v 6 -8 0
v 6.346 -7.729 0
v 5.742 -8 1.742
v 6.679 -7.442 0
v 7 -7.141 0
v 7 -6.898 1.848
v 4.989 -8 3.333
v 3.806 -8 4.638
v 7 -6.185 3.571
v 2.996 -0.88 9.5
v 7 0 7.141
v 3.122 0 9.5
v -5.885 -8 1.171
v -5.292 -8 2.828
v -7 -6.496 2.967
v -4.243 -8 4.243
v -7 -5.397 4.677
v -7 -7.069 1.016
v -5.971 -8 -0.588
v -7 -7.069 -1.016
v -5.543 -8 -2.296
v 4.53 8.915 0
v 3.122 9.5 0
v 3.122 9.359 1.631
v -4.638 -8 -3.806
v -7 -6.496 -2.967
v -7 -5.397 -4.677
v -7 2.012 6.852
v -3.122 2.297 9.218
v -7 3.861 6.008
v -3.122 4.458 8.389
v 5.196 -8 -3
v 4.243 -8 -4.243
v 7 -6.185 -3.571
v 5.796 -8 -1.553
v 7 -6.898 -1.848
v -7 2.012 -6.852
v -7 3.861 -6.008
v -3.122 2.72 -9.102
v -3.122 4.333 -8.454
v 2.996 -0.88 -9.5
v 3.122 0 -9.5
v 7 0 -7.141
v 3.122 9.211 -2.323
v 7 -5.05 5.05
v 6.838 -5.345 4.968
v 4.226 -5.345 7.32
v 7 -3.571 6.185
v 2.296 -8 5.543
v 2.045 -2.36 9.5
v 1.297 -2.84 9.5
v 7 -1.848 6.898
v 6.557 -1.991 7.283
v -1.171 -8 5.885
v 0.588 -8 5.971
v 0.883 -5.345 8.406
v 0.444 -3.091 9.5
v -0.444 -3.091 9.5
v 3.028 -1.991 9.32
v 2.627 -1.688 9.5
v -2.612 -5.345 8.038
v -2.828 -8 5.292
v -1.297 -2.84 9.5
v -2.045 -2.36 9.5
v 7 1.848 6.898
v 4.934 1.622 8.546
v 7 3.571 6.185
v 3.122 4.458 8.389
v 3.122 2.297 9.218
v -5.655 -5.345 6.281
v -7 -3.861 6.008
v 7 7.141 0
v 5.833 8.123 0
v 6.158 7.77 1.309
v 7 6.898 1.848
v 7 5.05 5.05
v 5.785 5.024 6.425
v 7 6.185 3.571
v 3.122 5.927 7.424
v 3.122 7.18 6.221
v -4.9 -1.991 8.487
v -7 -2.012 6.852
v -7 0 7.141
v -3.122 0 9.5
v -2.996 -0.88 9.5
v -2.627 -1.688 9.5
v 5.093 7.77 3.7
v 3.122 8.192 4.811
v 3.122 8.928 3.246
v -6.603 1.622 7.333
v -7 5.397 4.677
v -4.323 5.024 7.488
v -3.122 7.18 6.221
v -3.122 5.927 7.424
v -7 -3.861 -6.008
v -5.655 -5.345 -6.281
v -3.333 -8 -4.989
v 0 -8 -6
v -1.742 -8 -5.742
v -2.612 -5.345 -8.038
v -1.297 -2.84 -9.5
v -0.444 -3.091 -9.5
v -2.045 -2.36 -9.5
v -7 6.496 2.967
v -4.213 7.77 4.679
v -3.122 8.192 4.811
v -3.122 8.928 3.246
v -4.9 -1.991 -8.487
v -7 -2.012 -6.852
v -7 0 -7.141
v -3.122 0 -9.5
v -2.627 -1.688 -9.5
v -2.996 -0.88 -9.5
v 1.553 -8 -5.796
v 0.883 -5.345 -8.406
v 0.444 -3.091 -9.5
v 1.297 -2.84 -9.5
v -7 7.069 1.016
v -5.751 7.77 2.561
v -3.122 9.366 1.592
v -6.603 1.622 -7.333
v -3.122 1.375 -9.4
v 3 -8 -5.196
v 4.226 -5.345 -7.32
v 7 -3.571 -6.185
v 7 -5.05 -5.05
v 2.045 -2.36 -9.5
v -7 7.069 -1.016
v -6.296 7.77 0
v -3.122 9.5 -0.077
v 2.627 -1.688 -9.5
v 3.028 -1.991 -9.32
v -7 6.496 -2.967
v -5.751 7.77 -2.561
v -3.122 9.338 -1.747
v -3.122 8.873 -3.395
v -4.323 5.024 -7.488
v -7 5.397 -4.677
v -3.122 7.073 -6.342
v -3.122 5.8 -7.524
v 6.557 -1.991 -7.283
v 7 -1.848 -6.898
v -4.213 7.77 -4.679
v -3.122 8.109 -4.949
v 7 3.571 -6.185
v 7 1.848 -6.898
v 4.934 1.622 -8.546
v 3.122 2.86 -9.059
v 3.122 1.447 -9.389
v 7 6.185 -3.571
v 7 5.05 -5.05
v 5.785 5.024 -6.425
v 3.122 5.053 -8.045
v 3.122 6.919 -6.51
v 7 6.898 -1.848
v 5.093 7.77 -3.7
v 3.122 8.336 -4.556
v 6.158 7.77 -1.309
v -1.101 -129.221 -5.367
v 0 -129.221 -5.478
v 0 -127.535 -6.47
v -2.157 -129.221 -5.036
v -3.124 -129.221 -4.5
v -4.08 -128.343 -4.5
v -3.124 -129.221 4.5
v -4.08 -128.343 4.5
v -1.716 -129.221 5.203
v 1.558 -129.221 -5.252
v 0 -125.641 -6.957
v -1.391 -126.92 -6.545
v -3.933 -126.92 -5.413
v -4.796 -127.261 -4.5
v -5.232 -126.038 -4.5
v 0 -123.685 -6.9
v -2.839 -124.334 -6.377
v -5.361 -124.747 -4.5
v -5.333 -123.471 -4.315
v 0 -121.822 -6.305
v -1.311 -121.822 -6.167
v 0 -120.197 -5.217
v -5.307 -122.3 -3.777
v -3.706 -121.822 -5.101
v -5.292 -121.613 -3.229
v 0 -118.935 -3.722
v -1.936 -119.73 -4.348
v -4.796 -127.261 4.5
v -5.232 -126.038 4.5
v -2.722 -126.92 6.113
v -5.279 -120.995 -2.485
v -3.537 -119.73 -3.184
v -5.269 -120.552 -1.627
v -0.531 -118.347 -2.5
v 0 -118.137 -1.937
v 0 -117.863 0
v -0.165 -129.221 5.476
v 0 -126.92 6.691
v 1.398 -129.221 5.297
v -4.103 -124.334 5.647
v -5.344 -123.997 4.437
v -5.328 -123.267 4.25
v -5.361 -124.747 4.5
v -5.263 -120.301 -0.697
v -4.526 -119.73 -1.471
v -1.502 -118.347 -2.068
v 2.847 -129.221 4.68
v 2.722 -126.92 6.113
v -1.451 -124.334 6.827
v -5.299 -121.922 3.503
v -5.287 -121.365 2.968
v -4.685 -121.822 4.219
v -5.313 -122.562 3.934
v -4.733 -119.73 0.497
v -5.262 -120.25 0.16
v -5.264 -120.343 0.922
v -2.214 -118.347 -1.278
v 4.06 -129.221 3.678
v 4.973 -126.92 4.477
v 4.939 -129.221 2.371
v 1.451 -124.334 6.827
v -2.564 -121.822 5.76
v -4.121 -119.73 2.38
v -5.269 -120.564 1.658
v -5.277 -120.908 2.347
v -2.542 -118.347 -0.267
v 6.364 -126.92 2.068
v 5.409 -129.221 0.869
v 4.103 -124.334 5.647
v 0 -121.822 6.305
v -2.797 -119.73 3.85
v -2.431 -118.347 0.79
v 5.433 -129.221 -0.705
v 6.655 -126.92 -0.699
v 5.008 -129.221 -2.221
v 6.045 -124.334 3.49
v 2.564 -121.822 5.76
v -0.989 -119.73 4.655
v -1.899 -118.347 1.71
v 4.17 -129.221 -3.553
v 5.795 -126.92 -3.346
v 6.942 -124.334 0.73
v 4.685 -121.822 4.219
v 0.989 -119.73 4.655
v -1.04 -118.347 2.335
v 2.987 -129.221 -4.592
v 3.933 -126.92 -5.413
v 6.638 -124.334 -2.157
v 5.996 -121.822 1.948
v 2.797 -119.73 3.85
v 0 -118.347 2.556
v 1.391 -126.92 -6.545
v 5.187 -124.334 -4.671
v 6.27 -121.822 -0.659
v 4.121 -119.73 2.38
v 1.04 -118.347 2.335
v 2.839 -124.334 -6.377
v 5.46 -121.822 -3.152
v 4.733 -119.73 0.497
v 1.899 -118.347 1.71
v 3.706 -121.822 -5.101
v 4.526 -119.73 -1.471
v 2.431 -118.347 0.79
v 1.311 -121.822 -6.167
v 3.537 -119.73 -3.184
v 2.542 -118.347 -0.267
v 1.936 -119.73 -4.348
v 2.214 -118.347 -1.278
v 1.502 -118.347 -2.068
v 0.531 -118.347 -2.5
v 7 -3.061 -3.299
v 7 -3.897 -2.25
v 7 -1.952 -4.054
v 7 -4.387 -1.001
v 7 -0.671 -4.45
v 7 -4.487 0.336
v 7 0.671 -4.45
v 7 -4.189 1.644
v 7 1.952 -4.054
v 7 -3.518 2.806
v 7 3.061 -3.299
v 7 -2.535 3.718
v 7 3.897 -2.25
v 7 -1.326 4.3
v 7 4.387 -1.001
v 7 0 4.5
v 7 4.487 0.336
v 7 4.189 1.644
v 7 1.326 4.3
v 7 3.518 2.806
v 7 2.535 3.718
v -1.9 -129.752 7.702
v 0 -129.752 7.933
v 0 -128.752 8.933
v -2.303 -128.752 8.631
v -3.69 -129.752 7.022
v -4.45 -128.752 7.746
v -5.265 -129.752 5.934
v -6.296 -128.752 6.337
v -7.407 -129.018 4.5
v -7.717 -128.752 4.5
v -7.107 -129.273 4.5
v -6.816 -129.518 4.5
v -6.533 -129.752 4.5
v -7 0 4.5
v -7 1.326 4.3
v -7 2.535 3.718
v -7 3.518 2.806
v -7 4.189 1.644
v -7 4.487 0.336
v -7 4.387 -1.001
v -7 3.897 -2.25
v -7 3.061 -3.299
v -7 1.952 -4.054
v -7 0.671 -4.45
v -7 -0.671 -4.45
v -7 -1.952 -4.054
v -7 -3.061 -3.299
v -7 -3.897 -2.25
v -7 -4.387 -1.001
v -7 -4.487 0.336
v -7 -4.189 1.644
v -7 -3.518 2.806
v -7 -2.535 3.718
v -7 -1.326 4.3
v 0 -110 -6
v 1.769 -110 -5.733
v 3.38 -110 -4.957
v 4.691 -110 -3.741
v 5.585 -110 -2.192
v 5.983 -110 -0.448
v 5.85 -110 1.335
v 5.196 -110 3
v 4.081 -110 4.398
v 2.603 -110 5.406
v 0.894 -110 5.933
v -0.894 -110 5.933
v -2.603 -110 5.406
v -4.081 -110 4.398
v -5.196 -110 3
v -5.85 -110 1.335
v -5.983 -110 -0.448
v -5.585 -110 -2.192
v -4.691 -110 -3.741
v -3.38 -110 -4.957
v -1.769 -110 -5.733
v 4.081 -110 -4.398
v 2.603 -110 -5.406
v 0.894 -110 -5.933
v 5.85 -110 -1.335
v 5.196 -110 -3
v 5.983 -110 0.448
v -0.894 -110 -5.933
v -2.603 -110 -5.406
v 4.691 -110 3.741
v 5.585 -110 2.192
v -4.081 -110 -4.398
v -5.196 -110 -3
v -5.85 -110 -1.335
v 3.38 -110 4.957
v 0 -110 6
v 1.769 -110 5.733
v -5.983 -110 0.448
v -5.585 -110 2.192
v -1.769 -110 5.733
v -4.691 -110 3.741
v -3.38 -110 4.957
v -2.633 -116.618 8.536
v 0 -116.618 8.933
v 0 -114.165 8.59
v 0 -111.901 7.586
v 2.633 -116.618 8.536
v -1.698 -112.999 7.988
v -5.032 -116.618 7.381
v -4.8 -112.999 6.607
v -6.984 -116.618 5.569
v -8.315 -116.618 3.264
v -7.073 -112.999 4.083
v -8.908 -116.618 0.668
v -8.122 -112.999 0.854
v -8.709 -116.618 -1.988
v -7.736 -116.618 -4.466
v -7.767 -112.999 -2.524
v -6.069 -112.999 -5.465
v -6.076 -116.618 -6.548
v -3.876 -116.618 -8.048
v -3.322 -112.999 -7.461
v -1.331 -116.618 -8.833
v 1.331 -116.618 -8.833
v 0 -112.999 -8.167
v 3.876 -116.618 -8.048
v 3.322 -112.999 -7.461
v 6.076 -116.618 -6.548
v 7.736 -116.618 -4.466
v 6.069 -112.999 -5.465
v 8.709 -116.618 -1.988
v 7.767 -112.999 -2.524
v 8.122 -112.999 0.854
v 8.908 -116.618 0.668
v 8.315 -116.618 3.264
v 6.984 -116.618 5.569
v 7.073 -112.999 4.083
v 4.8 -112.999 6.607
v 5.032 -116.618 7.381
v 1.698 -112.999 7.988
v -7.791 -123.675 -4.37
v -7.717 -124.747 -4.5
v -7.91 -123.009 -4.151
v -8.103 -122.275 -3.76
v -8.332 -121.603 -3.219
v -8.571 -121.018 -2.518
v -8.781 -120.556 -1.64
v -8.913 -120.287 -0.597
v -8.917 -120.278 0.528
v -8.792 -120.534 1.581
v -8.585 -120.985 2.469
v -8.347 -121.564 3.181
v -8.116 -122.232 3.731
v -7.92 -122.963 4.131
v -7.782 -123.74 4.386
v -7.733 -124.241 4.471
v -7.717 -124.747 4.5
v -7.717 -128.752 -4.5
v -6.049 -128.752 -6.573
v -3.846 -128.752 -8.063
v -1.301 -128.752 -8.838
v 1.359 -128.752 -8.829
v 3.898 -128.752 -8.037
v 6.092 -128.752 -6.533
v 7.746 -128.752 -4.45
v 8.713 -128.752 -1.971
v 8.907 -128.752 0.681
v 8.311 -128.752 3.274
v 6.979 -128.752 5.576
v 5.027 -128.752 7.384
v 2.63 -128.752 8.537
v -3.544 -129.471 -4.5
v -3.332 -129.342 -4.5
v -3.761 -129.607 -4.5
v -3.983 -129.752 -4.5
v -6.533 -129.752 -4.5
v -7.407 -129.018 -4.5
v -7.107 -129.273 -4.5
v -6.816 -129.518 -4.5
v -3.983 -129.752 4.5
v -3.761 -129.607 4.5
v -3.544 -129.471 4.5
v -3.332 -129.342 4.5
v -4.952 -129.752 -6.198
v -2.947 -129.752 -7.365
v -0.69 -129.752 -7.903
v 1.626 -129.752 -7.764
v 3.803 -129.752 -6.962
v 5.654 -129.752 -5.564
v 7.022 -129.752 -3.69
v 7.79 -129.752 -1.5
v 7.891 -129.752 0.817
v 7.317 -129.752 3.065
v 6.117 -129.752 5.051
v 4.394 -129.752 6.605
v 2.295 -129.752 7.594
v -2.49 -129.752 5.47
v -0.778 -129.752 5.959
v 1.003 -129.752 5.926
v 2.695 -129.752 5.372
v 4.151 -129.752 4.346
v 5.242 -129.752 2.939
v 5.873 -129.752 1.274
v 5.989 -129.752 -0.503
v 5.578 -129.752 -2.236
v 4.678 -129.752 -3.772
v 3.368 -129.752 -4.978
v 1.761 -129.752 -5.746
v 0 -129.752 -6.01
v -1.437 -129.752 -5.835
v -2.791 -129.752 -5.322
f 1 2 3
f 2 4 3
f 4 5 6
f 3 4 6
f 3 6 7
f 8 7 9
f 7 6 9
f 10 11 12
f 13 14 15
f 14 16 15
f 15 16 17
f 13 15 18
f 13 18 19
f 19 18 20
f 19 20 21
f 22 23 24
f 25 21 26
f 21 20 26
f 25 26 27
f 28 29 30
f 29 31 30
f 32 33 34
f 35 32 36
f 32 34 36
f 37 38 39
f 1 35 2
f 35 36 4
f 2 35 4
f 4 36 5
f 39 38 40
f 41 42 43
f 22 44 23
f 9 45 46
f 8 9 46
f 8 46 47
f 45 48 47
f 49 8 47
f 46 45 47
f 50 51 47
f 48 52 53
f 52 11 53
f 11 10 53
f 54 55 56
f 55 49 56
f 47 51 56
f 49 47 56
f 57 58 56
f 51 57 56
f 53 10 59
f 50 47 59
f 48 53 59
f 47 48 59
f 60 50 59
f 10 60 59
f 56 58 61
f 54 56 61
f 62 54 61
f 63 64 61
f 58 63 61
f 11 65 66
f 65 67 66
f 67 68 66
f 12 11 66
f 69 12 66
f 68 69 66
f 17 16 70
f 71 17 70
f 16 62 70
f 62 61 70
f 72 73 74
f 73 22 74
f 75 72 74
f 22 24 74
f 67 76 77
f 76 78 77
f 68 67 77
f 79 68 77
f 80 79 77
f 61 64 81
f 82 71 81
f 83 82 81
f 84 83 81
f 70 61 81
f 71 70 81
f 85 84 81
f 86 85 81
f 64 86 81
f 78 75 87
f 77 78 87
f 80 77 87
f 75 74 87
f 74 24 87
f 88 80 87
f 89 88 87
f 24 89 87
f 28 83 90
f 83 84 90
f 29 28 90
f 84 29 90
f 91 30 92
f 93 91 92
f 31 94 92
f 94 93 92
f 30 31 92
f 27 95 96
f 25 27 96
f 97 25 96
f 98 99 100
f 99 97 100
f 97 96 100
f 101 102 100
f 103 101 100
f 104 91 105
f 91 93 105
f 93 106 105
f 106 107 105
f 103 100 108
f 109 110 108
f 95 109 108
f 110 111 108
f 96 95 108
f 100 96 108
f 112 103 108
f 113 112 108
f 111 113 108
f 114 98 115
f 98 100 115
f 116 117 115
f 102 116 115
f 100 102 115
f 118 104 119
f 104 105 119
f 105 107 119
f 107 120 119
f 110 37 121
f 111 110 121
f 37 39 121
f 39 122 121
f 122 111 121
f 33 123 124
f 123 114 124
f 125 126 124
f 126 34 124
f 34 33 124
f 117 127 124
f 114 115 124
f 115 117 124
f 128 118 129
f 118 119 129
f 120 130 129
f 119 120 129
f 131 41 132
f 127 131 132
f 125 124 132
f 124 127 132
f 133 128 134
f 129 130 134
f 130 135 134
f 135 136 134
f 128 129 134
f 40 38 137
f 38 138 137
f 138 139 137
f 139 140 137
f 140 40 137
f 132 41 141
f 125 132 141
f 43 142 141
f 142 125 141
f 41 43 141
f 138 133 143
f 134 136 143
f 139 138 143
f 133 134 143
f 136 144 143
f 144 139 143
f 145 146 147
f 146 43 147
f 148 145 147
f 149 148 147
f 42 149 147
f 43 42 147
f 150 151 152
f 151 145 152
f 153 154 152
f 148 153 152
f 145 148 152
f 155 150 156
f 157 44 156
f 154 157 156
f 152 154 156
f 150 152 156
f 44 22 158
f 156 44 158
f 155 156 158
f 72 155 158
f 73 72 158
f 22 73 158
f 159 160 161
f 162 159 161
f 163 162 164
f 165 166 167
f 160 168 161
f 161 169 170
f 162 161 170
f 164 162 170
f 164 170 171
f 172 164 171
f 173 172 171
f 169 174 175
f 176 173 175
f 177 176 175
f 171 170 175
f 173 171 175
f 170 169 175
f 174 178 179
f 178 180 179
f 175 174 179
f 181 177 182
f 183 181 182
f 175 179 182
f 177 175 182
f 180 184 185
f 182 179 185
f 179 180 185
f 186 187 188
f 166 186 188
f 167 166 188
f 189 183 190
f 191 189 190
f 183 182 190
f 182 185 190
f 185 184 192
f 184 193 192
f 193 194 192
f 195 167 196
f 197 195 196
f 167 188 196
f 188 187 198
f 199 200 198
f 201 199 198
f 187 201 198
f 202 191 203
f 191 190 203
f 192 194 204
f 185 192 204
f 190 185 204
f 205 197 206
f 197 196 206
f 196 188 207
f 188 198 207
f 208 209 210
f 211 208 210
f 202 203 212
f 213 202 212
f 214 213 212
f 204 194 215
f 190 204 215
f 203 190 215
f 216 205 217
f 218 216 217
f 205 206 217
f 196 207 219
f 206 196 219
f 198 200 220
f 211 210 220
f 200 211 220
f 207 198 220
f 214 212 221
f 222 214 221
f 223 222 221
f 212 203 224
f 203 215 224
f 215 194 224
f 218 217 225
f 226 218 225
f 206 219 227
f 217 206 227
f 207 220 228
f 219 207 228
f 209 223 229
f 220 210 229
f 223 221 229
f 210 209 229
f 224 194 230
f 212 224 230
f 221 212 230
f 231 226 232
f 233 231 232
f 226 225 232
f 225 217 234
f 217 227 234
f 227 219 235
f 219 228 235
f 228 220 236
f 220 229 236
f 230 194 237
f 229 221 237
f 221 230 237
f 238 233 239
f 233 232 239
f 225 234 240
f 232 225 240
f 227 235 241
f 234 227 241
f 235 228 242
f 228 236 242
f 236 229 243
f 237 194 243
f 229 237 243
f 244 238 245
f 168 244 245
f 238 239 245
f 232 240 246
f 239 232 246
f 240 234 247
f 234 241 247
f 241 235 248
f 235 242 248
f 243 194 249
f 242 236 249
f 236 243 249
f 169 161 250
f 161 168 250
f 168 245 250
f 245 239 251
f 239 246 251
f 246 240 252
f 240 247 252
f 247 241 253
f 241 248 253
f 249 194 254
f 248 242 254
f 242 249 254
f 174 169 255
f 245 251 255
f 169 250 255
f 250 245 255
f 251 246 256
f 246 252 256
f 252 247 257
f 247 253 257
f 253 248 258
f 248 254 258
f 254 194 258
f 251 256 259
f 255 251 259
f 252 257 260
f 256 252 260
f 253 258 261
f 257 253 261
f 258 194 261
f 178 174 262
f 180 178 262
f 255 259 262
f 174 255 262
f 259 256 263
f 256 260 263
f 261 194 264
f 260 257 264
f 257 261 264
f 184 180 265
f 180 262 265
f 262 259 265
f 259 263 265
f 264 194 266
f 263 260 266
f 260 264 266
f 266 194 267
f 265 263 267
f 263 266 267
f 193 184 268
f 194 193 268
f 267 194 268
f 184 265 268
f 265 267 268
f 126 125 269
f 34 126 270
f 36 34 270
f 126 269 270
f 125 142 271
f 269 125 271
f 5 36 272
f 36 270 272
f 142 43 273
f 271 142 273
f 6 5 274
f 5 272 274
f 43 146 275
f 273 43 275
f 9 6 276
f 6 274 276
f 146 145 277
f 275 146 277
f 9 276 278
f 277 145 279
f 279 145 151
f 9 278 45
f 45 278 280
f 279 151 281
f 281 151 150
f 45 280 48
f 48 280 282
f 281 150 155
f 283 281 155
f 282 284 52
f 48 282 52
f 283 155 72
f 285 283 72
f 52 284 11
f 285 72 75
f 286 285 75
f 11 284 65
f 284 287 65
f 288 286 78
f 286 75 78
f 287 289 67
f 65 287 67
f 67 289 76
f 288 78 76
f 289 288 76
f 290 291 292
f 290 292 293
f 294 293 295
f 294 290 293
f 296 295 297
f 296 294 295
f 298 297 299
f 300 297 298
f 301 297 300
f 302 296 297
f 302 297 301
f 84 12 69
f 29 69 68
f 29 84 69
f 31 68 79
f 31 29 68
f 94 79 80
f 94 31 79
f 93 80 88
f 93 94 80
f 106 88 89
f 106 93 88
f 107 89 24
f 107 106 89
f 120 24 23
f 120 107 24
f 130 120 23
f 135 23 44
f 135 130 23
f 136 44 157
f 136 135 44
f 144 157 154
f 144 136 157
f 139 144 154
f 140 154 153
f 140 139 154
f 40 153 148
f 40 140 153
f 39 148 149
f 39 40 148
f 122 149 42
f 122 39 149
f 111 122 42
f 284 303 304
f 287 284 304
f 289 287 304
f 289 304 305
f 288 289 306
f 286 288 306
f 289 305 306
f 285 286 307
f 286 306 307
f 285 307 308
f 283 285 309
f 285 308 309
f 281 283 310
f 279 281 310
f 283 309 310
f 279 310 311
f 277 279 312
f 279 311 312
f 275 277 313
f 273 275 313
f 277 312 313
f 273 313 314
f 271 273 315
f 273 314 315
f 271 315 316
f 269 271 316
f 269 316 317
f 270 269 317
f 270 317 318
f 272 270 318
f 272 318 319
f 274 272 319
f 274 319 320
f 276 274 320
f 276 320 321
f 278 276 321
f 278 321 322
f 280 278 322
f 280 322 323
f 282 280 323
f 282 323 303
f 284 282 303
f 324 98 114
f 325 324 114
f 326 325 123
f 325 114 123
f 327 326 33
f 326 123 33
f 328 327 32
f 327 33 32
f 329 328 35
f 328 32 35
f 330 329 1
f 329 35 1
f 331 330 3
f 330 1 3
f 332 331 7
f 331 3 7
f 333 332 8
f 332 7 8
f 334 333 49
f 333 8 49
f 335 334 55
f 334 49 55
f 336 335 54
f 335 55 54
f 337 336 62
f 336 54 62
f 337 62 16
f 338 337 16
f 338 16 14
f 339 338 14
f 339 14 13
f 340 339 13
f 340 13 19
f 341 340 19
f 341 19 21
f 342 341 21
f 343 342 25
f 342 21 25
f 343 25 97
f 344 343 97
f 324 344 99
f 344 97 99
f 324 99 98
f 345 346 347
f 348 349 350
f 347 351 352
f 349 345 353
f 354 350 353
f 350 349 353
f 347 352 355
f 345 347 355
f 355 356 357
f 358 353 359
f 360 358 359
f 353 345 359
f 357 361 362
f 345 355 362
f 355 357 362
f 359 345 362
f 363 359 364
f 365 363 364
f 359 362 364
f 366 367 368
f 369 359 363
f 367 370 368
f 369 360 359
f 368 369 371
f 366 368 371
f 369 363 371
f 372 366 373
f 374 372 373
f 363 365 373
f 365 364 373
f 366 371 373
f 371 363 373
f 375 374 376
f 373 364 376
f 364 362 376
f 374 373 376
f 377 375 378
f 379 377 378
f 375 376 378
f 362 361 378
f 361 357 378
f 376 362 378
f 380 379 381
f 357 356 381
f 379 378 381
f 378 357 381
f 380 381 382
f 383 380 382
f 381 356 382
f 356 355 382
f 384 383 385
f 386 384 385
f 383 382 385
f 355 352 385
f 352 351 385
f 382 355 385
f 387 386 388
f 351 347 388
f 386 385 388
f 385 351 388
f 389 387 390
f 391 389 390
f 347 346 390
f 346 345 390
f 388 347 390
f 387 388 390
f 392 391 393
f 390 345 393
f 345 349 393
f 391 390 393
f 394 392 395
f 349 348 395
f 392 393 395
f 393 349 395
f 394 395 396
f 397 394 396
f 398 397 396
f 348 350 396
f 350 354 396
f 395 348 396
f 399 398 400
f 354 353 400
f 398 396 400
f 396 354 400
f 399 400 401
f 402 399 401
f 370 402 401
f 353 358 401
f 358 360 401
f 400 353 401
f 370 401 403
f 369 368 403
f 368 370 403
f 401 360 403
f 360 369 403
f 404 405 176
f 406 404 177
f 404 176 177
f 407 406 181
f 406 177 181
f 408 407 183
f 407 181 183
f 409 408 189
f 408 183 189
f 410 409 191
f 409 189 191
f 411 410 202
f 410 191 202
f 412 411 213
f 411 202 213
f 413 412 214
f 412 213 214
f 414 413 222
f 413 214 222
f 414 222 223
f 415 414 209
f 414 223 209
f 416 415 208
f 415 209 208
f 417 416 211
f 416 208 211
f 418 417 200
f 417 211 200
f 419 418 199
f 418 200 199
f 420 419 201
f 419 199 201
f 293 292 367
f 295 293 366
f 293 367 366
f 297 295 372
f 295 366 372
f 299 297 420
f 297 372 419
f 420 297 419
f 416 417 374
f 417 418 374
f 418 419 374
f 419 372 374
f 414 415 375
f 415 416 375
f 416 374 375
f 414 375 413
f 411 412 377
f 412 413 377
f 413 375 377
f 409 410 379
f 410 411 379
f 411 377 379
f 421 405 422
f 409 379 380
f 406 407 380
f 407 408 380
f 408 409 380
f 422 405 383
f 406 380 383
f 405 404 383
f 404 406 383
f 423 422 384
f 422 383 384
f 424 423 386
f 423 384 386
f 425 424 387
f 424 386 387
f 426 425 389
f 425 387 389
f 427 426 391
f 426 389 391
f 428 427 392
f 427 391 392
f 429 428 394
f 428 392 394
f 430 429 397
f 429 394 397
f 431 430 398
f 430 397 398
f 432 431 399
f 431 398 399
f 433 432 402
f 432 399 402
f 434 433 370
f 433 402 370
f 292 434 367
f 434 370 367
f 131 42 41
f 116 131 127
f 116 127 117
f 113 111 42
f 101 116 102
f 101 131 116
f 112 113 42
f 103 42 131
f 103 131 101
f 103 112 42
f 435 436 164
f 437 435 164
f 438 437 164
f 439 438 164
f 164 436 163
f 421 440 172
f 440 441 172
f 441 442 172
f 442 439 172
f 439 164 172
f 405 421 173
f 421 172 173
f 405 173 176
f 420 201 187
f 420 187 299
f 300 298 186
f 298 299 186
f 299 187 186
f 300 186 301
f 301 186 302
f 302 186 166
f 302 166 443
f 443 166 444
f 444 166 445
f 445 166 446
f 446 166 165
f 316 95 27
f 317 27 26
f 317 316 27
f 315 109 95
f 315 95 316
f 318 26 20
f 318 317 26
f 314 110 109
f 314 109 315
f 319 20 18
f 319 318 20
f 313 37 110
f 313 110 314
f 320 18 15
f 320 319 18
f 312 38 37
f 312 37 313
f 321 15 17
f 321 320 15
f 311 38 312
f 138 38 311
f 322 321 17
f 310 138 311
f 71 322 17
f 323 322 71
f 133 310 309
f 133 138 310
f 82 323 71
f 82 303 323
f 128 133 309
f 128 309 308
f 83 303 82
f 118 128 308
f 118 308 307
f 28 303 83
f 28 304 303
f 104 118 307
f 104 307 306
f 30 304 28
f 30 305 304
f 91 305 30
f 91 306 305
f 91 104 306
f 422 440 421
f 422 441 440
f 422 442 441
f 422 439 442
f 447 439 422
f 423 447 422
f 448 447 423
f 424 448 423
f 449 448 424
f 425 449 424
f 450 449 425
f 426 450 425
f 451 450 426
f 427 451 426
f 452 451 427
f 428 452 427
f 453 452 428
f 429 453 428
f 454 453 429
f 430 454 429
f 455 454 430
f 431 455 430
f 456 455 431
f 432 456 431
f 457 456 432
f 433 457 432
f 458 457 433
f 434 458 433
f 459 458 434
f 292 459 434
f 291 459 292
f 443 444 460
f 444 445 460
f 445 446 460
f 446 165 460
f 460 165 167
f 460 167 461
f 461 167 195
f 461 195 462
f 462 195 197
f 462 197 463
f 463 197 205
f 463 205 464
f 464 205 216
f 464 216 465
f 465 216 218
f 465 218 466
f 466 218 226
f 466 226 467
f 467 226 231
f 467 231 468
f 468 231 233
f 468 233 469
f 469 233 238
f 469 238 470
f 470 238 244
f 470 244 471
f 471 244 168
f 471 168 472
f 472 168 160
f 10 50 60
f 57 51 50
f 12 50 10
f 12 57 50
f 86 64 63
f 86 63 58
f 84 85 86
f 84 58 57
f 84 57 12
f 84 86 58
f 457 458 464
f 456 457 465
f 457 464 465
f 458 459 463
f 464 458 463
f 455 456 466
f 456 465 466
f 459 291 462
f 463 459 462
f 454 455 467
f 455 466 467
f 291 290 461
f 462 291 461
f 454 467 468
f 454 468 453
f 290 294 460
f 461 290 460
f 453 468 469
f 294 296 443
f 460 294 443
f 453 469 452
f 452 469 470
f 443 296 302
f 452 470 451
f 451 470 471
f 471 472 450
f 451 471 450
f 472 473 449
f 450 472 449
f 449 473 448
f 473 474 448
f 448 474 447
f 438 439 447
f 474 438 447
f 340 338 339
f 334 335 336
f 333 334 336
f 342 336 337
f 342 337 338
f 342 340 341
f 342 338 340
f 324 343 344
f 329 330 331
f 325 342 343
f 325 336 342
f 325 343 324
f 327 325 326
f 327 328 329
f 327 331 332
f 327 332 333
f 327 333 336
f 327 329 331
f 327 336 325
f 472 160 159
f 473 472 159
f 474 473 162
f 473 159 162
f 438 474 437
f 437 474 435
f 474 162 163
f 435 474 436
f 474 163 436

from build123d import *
from build123d.topology import SkipClean

# Parameters (mm, degrees)
CUT_EXTRUDE_1_DEPTH      = 25.494897428
CUT_EXTRUDE_2_DEPTH      = 20.899748742
EXTRUDE_4_DEPTH          = 100
EXTRUDE_4_DEPTH_BACK     = 10
SKETCH_5_R               = 6
CUT_EXTRUDE_3_REACH      = 132.406
CUT_EXTRUDE_3_END_RADIUS = 8.932783894
CHAMFER_2_SIZE           = 1
SKETCH_9_R               = 4.5
CUT_EXTRUDE_4_DEPTH      = 132.071694674


with BuildPart() as part:
    # Эскиз1 → Повернуть1 (revolve)
    with BuildSketch(Plane.XY):
        with BuildLine():
            Line((0, 10), (0, -10))
            ThreePointArc((0, -10), (10, 0), (0, 10))
        make_face()
    revolve(axis=Axis((0, 10, 0), (0, -1, 0)))

    # Эскиз3 → Вырез-Вытянуть1 (cut, through all)
    with SkipClean():  # the faces are left unmerged after this step: merging them gives an invalid solid
        with BuildSketch(Plane(origin=(0, 10, 0), x_dir=(1, 0, 0), z_dir=(0, 1, 0))):
            with BuildLine():
                Line((-7, 7.141428429), (-7, -7.141428429))
                ThreePointArc((-7, -7.141428429), (-10, 0), (-7, 7.141428429))
            make_face()
            with BuildLine():
                Line((7, 7.141428429), (7, -7.141428429))
                ThreePointArc((7, -7.141428429), (10, 0), (7, 7.141428429))
            make_face()
        extrude(amount=-CUT_EXTRUDE_1_DEPTH, mode=Mode.SUBTRACT)

    # Эскиз4 → Вырез-Вытянуть2 (cut, through all)
    with SkipClean():  # the faces are left unmerged after this step: merging them gives an invalid solid
        with BuildSketch(Plane.ZY.offset(7)):
            with BuildLine():
                Line((-9.5, 0), (-9.5, -11.558193376))
                Line((-9.5, -11.558193376), (-11.108111605, -11.558193376))
                Line((-11.108111605, -11.558193376), (-11.108111605, 11.628024295))
                Line((-11.108111605, 11.628024295), (11.340171681, 11.628024295))
                Line((11.340171681, 11.628024295), (11.340171681, -11.558193376))
                Line((11.340171681, -11.558193376), (9.5, -11.558193376))
                Line((9.5, -11.558193376), (9.5, 0))
                ThreePointArc((9.5, 0), (0, 9.5), (-9.5, 0))
            make_face()
        extrude(amount=-CUT_EXTRUDE_2_DEPTH, mode=Mode.SUBTRACT)

    # Эскиз5 → Бобышка-Вытянуть4 (add, two sides: drawn at the far end of the back side and taken through both)
    with SkipClean():  # the faces are left unmerged after this step: merging them gives an invalid solid
        with BuildSketch(Plane(origin=(0, -10, 0), x_dir=(-1, 0, 0), z_dir=(0, -1, 0)).offset(-EXTRUDE_4_DEPTH_BACK)):
            with Locations(Location((0, 0, 0), (0, 0, 90))):
                Circle(SKETCH_5_R)
        extrude(amount=EXTRUDE_4_DEPTH + EXTRUDE_4_DEPTH_BACK)

    # Эскиз9 → Вырез-Вытянуть4 (cut, through all)
    with SkipClean():  # the faces are left unmerged after this step: merging them gives an invalid solid
        with BuildSketch(Plane.ZY.offset(7)):
            Circle(SKETCH_9_R)
        extrude(amount=-CUT_EXTRUDE_4_DEPTH, mode=Mode.SUBTRACT)


with BuildPart() as body_2:
    # Эскиз6 → Повернуть2 (revolve)
    with BuildSketch(Plane.XY, mode=Mode.PRIVATE) as revolve_2_sk:
        with BuildLine():
            Line((0, -110), (0, -129.752400891))
            Line((0, -129.752400891), (-8.932783894, -129.752400891))
            Line((-8.932783894, -129.752400891), (-8.932783894, -116.617750985))
            ThreePointArc((-8.932783894, -116.617750985), (-8.166741439, -112.998502117), (-6, -110))
            Line((-6, -110), (0, -110))
        make_face()
    revolve(revolve_2_sk.sketch.rotate(Axis((0, -110, 0), (0, -1, 0)), 270), axis=Axis((0, -110, 0), (0, -1, 0)))

    # Эскиз7 → Вырез-Повернуть1 (revolve, cut)
    with BuildSketch(Plane(origin=(0, 0, 0), x_dir=(0, 0, -1), z_dir=(1, 0, 0))):
        with BuildLine():
            Line((0, -117.863437075), (0, -131.863437075))
            ThreePointArc((0, -131.863437075), (7, -124.863437075), (0, -117.863437075))
        make_face()
    revolve(axis=Axis((0, -129.752400891, 0), (0, 1, 0)), mode=Mode.SUBTRACT)

    # Вырез-Вытянуть3: up to this cylinder (the profile starts inside it)
    cut_extrude_3_end = Plane(origin=(0, -125.423518, 0), z_dir=(0, 1, 0)) * Cylinder(CUT_EXTRUDE_3_END_RADIUS, 283.677567788, mode=Mode.PRIVATE)
    # Эскиз8 → Вырез-Вытянуть3 (cut, up to the surface)
    with BuildSketch(Plane(origin=(0, 0, 0), x_dir=(0, 0, -1), z_dir=(1, 0, 0)), mode=Mode.PRIVATE) as cut_extrude_3_sk1:
        with BuildLine():
            Line((-4.5, -124.747055334), (-4.5, -129.752400891))
            Line((-4.5, -129.752400891), (4.5, -129.752400891))
            Line((4.5, -129.752400891), (4.5, -124.747055334))
            ThreePointArc((4.5, -124.747055334), (0, -120.247055334), (-4.5, -124.747055334))
        make_face()
    cut_extrude_3_tool1 = extrude(cut_extrude_3_sk1.sketch, amount=-CUT_EXTRUDE_3_REACH, mode=Mode.PRIVATE) & cut_extrude_3_end
    add(cut_extrude_3_tool1.solids().sort_by_distance((0, -125.423518, 0))[0], mode=Mode.SUBTRACT)

    # Фаска2
    # the kernel refuses this chamfer: 1, 0.707159459 mm, written as the material it takes off along each edge
    with BuildSketch(Plane(origin=(0, -129.752400891, 0), x_dir=(-0.8245803433521156, 0, 0.5657448694926958), z_dir=(-0.5657448694926958, 0, -0.8245803433521156))) as chamfer_2_piece_1:
        with BuildLine():
            Line((5.009793689 + CHAMFER_2_SIZE, 0), (5.47833473, 0.531458959))
            ThreePointArc((5.47833473, 0.531458959), (5.251626356, 0.260743789), (5.009793689, 0))
            Line((5.009793689, 0), (5.009793689 + CHAMFER_2_SIZE, 0))
        make_face()
    revolve(axis=Axis((0, -129.752400891, 0), (0, 1, 0)), revolution_arc=235.545967623, mode=Mode.SUBTRACT)
    with BuildSketch(Plane(origin=(0, -129.752400891, 0), x_dir=(-0.971519805459464, 0, -0.23695836680734683), z_dir=(-0.23695836680734683, 0, 0.971519805459464))) as chamfer_2_piece_2:
        Polygon((8.932783894, -CHAMFER_2_SIZE), (8.932783894 - CHAMFER_2_SIZE, 0), (8.932783894, 0), align=None)
    revolve(axis=Axis((0, -129.752400891, 0), (0, -1, 0)), revolution_arc=256.292910039, mode=Mode.SUBTRACT)
    with BuildSketch(Plane(origin=(0, -129.752400891, 0), x_dir=(0, 0, 1), z_dir=(1, 0, 0))) as chamfer_2_piece_3:
        Polygon((8.932783894, -CHAMFER_2_SIZE), (8.932783894 - CHAMFER_2_SIZE, 0), (8.932783894, 0), align=None)
    revolve(axis=Axis((0, -129.752400891, 0), (0, -1, 0)), revolution_arc=76.248727648, mode=Mode.SUBTRACT)
    with BuildSketch(Plane(origin=(0, -129.752400891, 0), x_dir=(0, 0, -1), z_dir=(1, 0, 0))) as chamfer_2_piece_4:
        with BuildLine():
            Line((5.009793689 + CHAMFER_2_SIZE, 0), (5.47833473, 0.531458959))
            ThreePointArc((5.47833473, 0.531458959), (5.251626356, 0.260743789), (5.009793689, 0))
            Line((5.009793689, 0), (5.009793689 + CHAMFER_2_SIZE, 0))
        make_face()
    revolve(axis=Axis((0, -129.752400891, 0), (0, 1, 0)), revolution_arc=55.484942969, mode=Mode.SUBTRACT)


solid = Compound([part.part, body_2.part])
